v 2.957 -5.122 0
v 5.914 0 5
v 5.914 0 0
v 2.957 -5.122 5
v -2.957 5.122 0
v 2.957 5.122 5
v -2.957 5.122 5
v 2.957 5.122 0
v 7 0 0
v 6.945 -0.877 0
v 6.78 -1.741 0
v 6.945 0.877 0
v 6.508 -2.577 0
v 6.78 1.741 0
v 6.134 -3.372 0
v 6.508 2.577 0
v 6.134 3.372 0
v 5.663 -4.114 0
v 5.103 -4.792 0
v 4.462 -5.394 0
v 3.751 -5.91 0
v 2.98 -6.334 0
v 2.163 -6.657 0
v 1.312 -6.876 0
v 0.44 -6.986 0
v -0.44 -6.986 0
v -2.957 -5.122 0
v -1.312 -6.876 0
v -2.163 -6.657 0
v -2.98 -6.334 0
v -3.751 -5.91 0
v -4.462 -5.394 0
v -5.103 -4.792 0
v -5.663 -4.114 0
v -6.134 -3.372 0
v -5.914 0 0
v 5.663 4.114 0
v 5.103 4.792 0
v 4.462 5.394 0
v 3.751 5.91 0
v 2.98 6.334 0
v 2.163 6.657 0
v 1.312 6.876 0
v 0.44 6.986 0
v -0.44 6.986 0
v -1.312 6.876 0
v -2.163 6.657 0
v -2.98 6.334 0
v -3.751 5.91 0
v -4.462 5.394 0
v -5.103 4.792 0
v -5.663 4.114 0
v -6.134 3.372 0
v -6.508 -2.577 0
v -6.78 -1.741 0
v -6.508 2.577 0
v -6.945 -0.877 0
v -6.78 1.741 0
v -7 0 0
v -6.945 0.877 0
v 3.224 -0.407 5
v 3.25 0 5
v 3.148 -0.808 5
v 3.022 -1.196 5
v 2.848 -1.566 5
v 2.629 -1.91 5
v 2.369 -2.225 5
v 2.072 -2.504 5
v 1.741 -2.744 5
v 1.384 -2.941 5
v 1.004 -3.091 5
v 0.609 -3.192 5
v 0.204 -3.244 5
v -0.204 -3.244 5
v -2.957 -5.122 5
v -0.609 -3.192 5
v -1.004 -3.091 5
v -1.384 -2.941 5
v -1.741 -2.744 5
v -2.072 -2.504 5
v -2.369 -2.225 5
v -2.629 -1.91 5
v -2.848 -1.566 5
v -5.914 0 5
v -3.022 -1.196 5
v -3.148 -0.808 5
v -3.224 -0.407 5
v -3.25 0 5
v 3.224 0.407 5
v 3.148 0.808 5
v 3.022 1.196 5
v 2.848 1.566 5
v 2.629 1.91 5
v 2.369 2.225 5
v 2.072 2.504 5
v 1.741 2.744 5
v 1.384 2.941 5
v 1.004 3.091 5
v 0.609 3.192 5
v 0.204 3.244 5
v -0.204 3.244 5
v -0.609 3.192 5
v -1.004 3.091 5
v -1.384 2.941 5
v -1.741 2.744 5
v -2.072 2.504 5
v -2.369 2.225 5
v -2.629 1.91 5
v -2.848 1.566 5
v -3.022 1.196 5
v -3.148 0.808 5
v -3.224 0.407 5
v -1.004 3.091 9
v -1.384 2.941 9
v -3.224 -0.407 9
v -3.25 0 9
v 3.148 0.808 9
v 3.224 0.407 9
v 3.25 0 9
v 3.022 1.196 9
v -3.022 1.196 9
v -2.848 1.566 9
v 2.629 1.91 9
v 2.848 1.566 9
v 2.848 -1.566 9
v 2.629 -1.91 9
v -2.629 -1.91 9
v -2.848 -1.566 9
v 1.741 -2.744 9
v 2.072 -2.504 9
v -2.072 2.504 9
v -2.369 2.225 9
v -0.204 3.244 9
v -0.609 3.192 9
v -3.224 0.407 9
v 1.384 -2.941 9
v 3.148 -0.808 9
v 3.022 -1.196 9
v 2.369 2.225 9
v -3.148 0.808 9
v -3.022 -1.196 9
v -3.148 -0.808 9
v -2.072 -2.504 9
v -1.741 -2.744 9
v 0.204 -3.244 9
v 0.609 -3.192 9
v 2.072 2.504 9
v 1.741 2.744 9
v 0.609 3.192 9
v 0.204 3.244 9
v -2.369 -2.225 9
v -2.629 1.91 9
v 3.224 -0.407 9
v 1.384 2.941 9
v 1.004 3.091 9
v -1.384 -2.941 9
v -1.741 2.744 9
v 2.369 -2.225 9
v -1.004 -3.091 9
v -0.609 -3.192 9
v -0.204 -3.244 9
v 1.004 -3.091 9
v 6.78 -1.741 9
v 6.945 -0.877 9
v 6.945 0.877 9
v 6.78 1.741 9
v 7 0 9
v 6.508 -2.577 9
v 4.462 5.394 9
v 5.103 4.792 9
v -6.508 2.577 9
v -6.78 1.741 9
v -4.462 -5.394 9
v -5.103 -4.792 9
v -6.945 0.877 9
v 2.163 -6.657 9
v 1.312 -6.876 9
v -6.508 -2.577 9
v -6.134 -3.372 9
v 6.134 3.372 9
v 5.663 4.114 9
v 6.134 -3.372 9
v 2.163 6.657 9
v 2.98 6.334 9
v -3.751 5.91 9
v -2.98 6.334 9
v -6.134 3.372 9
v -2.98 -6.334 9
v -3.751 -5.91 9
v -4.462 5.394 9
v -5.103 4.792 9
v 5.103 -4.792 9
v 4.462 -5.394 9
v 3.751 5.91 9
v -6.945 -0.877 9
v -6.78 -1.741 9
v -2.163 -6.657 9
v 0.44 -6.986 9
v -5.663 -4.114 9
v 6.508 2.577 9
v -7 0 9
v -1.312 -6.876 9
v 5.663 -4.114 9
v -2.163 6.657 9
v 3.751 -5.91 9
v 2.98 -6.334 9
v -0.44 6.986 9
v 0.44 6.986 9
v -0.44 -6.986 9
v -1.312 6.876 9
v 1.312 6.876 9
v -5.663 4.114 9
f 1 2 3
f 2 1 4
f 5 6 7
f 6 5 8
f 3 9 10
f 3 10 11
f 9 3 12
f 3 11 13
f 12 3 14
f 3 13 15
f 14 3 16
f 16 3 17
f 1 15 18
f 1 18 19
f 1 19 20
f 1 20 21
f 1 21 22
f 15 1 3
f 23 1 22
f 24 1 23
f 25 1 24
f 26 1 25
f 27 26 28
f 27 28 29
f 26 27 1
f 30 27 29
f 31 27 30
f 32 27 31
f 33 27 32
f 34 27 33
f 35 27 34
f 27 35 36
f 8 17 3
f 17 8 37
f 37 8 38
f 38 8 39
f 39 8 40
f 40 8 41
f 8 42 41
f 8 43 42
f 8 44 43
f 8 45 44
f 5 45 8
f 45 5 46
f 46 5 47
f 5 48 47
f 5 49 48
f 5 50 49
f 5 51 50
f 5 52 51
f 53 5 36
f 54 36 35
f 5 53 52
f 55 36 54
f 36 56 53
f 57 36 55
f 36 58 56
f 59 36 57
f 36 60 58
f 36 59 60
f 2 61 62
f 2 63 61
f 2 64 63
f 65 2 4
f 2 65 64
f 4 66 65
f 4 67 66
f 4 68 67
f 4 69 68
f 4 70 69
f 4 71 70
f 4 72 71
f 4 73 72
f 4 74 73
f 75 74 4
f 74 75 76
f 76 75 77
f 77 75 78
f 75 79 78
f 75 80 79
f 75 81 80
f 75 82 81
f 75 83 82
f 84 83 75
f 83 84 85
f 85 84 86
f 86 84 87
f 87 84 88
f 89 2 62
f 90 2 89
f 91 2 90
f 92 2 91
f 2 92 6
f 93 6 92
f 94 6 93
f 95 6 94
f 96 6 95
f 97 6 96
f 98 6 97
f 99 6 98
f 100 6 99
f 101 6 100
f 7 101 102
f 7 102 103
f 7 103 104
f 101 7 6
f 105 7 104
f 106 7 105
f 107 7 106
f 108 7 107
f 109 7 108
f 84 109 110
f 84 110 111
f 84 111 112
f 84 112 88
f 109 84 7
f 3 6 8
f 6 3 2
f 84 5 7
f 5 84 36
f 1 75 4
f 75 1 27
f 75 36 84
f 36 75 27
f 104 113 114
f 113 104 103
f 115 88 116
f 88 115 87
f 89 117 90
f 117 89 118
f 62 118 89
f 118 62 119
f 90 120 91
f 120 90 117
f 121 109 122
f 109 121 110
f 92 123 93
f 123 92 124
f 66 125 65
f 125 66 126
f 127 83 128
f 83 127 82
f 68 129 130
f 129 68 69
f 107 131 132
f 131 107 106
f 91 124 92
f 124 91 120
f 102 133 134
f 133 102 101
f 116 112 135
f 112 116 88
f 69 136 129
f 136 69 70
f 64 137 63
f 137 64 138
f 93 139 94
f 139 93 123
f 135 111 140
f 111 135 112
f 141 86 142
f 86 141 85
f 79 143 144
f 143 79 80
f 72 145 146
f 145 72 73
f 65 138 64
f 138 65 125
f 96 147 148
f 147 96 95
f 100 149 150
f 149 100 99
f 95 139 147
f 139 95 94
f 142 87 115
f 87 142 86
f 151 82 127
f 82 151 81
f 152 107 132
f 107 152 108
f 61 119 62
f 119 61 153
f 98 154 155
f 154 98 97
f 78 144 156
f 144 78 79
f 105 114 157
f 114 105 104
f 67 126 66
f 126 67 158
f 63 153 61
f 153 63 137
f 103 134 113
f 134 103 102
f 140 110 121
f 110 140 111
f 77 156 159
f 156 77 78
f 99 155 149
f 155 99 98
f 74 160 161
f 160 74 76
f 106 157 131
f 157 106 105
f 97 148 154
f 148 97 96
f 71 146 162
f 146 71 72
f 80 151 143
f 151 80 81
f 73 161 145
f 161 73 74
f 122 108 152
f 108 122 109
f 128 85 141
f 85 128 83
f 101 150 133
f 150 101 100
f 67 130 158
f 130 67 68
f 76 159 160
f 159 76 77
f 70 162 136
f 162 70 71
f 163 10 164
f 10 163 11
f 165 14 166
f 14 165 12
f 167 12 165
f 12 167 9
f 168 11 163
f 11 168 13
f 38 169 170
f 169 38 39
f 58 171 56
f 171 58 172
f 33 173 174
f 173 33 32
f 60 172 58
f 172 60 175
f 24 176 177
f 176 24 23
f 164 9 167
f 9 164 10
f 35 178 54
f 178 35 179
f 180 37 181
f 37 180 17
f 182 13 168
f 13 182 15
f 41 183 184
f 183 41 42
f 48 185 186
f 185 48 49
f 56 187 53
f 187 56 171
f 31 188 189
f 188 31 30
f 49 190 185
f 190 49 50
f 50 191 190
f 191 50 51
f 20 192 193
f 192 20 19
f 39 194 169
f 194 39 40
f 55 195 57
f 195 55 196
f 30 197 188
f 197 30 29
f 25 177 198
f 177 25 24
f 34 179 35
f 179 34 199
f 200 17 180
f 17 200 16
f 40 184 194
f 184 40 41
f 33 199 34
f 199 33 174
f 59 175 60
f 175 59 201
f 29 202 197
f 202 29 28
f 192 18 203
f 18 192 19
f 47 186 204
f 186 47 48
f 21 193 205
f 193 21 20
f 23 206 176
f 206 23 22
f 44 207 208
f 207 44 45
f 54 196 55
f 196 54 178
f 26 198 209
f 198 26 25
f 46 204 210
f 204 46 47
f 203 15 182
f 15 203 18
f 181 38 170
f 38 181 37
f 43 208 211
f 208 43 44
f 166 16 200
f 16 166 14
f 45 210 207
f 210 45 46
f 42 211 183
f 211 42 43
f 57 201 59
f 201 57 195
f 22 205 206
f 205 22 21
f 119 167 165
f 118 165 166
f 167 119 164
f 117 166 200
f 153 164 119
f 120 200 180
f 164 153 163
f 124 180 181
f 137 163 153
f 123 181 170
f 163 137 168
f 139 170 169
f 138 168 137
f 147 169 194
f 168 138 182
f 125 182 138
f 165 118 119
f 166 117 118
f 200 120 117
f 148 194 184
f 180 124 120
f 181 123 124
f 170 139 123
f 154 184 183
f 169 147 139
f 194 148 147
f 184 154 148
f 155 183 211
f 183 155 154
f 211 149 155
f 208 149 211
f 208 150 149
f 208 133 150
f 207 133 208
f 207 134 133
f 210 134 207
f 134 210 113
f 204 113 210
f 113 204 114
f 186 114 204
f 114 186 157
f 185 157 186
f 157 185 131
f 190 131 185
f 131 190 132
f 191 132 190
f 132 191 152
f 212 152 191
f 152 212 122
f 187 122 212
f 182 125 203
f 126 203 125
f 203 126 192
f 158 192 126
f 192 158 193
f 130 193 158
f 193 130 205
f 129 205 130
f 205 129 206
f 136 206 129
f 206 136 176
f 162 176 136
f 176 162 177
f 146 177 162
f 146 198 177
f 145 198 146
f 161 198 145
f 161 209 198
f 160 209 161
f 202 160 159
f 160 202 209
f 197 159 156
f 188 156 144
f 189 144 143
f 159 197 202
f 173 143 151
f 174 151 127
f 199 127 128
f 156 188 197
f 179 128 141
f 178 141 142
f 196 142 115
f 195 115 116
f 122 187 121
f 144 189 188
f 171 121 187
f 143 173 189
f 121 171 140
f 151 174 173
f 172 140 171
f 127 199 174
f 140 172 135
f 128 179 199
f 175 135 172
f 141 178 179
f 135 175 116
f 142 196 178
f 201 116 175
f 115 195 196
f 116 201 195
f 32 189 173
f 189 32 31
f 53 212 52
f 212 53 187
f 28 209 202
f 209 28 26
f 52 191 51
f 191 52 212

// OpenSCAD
$fn = 50;


difference() {
	union() {
		cylinder(h = 9, r = 7.0000000000);
	}
	union() {
		translate(v = [0, 0, 0]) {
			rotate(a = [0, 0, 0]) {
				difference() {
					union() {
						#linear_extrude(height = 5) {
							polygon(points = [[5.9142500000, 0.0000000000], [2.9571250000, 5.1218907443], [-2.9571250000, 5.1218907443], [-5.9142500000, 0.0000000000], [-2.9571250000, -5.1218907443], [2.9571250000, -5.1218907443]]);
						}
					}
					union();
				}
			}
		}
		translate(v = [0, 0, -100]) {
			cylinder(h = 200, r = 3.2500000000);
		}
		translate(v = [0, 0, -100]) {
			cylinder(h = 200, r = 1.8000000000);
		}
	}
}
